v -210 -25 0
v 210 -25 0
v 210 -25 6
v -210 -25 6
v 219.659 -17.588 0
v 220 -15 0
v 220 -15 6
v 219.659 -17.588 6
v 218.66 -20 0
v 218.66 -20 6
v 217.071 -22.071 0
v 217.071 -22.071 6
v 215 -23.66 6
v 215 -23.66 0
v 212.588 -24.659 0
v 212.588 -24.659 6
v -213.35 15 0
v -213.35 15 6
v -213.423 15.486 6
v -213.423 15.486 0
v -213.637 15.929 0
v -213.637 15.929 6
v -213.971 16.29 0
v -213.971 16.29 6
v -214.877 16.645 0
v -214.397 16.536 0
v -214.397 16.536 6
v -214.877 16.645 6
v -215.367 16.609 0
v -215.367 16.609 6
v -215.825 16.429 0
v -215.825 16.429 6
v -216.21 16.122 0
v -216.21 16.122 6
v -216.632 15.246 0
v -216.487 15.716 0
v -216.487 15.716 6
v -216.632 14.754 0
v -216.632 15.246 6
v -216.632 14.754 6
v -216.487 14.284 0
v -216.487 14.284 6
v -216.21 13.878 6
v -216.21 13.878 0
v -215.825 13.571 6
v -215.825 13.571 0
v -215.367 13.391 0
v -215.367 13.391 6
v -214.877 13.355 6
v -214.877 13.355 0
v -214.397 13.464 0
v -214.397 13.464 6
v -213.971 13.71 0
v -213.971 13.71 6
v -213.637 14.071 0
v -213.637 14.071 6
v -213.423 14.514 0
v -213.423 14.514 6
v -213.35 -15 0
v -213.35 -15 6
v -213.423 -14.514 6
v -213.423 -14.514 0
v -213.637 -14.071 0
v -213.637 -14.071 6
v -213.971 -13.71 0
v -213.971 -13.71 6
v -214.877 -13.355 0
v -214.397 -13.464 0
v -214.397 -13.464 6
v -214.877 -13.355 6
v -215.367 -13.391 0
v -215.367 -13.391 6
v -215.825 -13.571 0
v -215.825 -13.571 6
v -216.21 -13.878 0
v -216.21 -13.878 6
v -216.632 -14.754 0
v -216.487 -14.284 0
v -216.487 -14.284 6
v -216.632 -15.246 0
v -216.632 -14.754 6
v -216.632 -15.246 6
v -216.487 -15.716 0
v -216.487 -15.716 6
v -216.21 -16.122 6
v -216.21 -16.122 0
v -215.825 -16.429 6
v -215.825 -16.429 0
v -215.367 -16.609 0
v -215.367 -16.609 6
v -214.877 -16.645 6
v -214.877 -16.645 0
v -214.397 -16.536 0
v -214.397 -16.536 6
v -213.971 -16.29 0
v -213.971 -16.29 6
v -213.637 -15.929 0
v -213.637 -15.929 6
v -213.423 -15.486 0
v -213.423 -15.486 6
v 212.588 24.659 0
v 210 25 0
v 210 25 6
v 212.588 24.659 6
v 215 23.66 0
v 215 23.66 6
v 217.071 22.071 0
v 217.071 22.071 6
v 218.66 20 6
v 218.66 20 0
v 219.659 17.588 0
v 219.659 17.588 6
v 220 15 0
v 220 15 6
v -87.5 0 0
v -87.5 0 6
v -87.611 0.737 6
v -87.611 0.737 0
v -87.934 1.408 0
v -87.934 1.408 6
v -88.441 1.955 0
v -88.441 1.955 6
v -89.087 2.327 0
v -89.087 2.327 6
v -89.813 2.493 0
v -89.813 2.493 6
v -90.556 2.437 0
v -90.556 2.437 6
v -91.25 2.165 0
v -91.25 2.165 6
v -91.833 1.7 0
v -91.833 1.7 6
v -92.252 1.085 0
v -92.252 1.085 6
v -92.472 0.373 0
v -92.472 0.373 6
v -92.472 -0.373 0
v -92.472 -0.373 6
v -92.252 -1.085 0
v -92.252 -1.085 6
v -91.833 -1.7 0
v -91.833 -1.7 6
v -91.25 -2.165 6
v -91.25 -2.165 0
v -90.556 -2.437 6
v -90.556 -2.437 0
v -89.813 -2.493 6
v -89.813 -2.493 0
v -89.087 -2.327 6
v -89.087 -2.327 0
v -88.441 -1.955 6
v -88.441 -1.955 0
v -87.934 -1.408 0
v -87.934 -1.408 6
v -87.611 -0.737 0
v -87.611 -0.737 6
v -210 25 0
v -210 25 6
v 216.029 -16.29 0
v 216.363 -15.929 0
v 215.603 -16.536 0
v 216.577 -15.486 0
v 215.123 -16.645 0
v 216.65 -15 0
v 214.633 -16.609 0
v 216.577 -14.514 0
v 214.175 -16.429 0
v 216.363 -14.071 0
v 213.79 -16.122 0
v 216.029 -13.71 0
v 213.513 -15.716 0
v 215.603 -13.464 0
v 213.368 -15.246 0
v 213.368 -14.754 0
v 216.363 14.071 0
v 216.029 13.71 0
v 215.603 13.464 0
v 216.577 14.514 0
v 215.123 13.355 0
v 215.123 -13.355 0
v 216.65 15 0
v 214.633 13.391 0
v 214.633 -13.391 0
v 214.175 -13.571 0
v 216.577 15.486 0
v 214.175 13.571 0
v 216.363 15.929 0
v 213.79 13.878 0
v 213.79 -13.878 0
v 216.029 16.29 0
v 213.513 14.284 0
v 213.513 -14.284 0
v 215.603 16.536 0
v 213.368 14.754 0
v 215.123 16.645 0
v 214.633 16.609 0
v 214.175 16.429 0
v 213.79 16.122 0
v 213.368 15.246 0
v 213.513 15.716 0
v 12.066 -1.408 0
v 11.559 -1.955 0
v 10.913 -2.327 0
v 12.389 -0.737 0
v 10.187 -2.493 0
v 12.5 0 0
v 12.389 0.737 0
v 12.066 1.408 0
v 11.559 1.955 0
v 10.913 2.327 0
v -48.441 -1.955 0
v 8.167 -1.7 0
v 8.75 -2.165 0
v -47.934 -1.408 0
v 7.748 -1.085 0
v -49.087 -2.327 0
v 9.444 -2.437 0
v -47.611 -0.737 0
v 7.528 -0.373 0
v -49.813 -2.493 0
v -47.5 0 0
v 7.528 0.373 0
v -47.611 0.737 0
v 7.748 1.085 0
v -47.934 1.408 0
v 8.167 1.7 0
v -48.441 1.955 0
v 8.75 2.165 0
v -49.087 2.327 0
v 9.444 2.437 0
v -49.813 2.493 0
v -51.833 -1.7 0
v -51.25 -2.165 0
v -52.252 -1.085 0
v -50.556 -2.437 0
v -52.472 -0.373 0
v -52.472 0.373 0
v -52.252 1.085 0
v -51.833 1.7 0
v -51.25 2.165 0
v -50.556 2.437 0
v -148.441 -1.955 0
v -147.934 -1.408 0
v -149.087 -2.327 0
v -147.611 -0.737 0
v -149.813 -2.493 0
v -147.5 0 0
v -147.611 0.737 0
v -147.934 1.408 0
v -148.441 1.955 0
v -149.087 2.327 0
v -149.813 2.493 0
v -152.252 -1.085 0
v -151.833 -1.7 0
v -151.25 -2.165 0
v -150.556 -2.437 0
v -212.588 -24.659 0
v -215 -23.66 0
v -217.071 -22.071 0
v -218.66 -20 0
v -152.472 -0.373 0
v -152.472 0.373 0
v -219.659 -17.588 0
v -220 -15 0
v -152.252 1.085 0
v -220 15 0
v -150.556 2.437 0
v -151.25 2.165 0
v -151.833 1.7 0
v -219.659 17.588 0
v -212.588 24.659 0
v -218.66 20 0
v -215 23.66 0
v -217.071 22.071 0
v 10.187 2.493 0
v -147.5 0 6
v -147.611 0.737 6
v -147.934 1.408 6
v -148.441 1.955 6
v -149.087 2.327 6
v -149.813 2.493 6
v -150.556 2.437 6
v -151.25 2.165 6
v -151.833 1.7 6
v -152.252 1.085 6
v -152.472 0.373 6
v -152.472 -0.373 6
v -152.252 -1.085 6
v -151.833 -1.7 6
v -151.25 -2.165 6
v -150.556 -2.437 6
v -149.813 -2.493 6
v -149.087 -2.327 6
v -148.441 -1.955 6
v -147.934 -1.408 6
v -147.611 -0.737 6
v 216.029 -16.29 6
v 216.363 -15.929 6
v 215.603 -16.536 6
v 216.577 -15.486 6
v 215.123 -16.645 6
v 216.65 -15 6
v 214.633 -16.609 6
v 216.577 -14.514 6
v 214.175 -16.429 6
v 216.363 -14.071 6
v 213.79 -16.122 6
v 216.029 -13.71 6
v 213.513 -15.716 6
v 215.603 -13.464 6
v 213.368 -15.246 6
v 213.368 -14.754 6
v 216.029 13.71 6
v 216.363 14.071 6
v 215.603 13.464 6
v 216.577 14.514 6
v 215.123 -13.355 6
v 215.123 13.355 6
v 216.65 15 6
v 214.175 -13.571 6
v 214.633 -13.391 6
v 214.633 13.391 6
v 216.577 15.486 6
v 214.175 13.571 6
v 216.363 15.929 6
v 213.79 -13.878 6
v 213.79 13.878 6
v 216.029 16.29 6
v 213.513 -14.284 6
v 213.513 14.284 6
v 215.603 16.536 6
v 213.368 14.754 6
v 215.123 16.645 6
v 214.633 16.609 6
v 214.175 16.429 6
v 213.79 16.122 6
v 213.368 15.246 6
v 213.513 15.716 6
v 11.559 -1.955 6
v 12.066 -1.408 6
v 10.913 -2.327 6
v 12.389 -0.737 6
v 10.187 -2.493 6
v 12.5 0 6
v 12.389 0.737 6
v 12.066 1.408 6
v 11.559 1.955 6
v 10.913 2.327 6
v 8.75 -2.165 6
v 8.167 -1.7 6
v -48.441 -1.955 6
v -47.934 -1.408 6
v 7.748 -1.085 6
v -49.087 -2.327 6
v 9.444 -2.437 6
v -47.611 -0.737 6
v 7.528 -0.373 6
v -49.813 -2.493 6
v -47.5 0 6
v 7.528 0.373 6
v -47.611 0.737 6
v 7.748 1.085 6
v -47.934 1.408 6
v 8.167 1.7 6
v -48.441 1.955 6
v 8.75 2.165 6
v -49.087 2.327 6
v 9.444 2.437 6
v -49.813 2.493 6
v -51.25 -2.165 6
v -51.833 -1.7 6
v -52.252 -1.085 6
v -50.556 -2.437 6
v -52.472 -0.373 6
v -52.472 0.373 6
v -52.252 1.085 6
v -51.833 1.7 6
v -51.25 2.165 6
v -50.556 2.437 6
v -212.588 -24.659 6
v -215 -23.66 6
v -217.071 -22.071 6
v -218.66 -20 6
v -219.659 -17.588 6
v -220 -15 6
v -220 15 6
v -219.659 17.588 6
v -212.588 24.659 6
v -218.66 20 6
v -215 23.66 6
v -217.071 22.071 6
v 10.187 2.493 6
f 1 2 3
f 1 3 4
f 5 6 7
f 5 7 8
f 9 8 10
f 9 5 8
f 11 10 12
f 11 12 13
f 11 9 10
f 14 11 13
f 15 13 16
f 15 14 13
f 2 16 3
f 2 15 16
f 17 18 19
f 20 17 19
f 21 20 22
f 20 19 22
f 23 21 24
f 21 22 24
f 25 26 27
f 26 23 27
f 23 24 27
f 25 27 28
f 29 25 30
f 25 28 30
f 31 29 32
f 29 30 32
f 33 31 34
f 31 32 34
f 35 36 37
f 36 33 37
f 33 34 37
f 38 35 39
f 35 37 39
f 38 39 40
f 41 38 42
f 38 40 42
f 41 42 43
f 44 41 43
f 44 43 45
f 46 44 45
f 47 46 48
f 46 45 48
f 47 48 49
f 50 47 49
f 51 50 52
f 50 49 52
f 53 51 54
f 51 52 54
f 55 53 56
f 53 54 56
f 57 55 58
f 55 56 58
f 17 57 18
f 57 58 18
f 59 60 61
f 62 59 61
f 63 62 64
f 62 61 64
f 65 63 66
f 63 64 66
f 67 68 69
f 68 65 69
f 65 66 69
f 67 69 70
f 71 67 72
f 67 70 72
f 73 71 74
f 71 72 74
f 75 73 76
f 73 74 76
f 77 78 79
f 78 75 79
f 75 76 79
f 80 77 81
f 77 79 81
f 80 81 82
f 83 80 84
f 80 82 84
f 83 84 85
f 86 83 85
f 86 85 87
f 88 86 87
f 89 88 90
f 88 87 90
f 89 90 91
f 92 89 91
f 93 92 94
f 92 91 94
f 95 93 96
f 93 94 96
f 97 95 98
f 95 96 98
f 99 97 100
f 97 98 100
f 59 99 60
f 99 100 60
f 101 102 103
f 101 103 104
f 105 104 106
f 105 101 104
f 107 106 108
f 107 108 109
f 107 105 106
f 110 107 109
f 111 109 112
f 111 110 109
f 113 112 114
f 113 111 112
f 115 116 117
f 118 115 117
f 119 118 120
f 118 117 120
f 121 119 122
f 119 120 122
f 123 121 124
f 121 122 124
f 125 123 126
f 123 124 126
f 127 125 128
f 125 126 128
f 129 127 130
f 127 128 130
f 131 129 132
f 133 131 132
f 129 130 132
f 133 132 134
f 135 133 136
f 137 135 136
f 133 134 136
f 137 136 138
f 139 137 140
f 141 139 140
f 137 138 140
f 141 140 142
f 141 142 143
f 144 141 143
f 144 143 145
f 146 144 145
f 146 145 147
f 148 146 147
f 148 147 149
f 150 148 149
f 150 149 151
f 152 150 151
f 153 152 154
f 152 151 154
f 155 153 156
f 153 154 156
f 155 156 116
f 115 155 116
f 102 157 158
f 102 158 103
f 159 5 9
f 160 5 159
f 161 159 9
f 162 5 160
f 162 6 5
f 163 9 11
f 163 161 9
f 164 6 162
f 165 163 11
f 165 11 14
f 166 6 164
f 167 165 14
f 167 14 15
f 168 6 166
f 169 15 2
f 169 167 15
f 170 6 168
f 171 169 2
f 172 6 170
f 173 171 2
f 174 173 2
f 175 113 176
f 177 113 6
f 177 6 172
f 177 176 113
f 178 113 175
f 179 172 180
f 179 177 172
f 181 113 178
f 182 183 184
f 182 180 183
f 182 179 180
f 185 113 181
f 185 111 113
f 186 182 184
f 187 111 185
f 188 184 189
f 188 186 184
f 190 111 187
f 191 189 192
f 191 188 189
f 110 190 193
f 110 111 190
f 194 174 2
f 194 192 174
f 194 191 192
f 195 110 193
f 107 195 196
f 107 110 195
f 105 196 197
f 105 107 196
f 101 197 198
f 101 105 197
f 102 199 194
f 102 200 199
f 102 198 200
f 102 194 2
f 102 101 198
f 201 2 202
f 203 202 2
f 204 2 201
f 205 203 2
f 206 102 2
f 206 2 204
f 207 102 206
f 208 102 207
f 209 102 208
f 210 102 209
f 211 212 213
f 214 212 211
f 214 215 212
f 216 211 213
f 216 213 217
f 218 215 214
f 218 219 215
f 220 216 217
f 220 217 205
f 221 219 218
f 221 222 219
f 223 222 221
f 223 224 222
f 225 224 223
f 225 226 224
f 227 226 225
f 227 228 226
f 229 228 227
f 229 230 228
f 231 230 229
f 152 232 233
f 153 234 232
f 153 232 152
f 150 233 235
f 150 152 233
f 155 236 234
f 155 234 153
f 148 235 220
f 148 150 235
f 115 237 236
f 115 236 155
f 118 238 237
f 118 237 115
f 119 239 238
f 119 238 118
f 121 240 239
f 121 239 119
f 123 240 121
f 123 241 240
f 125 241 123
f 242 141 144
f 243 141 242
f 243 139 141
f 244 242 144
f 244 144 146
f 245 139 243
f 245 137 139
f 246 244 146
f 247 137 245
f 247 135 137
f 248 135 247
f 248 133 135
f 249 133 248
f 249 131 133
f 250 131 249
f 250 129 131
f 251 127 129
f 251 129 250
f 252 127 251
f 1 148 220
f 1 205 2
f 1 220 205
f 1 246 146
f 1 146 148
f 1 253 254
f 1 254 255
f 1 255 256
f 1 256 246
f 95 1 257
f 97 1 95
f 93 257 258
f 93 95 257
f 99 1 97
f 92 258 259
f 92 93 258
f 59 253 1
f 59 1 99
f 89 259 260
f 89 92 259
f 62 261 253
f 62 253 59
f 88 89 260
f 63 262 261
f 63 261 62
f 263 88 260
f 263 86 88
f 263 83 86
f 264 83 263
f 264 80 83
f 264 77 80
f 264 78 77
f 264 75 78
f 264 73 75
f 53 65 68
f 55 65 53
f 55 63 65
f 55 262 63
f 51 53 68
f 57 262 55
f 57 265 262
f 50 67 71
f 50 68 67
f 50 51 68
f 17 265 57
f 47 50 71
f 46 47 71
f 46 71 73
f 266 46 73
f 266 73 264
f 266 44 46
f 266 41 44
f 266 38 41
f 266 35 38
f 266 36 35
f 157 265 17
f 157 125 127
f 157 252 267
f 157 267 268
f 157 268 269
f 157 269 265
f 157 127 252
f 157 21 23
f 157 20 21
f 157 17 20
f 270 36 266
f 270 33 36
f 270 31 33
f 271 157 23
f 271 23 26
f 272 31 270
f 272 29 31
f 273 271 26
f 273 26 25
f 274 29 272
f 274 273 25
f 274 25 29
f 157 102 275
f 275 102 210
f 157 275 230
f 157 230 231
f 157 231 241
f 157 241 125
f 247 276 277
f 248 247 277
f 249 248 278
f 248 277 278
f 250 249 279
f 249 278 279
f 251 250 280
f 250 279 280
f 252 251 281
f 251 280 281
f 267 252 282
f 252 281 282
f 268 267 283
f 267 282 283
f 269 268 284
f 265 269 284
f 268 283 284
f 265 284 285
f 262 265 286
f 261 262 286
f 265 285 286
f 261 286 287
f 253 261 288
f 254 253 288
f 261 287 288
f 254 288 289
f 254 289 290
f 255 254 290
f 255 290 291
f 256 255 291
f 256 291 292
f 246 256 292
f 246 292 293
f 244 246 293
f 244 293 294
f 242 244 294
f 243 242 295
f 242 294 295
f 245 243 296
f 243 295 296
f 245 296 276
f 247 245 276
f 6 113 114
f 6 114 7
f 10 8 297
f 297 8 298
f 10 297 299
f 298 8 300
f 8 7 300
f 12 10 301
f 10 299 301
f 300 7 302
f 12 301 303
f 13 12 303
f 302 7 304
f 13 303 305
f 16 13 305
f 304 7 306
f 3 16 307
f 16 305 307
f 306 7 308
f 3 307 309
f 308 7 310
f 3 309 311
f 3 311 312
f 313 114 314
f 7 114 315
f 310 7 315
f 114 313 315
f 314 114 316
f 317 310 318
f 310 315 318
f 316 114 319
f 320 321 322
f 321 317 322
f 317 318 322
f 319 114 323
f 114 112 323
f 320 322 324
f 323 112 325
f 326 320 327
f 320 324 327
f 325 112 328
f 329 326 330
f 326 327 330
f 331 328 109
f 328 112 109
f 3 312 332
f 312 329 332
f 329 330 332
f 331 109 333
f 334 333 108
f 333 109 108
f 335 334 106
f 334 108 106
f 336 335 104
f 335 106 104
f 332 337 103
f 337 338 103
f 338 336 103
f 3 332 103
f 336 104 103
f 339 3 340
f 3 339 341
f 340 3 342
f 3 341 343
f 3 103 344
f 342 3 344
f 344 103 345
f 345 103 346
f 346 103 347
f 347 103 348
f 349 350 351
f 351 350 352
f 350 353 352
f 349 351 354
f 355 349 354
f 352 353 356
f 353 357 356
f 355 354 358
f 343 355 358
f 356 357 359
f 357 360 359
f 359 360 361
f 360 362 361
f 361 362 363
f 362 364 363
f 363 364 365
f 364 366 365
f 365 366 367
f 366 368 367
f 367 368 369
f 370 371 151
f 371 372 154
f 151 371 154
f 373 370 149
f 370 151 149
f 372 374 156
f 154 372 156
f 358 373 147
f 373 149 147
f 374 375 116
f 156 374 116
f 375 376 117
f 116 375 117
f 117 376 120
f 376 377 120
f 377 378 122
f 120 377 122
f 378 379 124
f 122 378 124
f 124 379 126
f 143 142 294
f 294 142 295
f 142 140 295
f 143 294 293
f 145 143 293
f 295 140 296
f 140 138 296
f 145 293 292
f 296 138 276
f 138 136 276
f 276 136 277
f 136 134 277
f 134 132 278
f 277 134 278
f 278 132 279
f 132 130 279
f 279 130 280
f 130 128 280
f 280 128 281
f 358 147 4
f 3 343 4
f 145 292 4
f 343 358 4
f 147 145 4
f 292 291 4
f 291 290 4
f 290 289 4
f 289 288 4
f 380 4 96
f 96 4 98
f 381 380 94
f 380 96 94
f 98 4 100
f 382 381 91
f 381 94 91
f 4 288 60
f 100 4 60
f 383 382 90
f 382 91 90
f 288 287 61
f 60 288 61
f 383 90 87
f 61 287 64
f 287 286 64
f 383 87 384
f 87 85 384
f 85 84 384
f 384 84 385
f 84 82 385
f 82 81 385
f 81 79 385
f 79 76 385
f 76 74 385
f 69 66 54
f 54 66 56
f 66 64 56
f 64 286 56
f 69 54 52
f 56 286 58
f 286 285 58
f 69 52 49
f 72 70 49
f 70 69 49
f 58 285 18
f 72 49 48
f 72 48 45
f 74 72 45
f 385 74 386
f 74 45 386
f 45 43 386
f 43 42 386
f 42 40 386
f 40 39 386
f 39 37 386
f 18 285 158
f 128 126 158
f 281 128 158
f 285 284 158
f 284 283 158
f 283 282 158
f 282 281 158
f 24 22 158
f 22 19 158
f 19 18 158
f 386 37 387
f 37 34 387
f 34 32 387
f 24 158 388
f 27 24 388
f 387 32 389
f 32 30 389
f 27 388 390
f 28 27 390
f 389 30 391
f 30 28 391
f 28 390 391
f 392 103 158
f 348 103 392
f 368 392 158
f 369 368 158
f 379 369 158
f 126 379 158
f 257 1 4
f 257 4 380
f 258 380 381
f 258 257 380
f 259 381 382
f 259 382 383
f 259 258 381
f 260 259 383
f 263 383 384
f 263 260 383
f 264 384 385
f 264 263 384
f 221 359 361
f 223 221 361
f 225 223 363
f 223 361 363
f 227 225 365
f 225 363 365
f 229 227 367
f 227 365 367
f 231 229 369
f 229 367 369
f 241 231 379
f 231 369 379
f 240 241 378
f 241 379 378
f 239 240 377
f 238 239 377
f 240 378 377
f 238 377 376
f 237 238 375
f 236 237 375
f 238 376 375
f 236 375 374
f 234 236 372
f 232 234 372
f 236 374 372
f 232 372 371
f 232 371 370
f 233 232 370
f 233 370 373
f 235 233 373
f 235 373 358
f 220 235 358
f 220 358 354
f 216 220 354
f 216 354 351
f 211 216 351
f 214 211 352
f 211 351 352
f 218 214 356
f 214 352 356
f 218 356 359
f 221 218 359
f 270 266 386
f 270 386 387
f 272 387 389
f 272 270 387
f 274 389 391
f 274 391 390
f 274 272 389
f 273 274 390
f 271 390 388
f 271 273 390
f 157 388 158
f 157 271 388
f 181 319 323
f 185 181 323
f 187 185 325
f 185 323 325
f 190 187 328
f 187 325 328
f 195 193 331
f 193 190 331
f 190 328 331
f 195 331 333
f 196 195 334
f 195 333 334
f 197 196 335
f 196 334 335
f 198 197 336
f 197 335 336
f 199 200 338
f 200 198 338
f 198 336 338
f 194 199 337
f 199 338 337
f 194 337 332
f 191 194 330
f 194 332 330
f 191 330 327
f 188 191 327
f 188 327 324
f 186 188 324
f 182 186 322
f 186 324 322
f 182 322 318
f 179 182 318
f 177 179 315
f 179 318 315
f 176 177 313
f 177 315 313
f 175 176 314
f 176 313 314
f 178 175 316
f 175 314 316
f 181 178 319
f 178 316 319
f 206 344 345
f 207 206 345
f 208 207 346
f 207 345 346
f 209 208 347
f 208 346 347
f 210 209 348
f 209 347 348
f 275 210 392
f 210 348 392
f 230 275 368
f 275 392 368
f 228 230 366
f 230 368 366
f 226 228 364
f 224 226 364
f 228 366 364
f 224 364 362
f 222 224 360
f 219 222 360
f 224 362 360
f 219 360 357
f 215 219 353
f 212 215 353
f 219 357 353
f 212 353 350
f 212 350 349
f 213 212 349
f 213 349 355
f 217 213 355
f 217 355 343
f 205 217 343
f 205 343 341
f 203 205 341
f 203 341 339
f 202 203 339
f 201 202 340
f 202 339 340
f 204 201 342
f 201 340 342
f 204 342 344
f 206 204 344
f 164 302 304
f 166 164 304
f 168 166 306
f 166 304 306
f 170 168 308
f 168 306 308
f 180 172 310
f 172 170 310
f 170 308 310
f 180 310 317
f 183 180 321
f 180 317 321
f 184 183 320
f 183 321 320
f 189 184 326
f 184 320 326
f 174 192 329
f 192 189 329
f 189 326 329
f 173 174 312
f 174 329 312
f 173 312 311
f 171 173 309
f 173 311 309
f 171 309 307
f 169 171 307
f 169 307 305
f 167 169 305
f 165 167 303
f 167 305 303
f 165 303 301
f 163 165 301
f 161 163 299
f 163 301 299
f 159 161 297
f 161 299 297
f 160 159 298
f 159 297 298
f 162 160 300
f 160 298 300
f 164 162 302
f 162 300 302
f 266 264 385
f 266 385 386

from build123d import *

# Parameters (mm, degrees)
BOSS_EXTRU_1_DEPTH                            = 6
ESQUISSE2_R                                   = 1.65
ESQUISSE2_R_2                                 = 2.5
ENL_V_MAT_EXTRU_1_DEPTH                       = 6
TROU_POUR_TARAUDAGE_POUR_TROU_TARAUD_M6_D     = 5
TROU_POUR_TARAUDAGE_POUR_TROU_TARAUD_M6_DEPTH = 15
TROU_POUR_TARAUDAGE_POUR_TROU_TARAUD_M6_TIP   = 1.502151548
TROU_POUR_TARAUDAGE_POUR_TROU_TARAUD_M4_D     = 3.3
TROU_POUR_TARAUDAGE_POUR_TROU_TARAUD_M4_DEPTH = 15
TROU_POUR_TARAUDAGE_POUR_TROU_TARAUD_M4_TIP   = 0.991420021


with BuildPart() as part:
    # Esquisse1 → Boss.-Extru.1 (new body)
    with BuildSketch(Plane.XY):
        with BuildLine():
            Line((210, -25), (-210, -25))
            ThreePointArc((-210, -25), (-217.071067812, -22.071067812), (-220, -15))
            Line((-220, -15), (-220, 15))
            ThreePointArc((-220, 15), (-217.071067812, 22.071067812), (-210, 25))
            Line((-210, 25), (210, 25))
            ThreePointArc((210, 25), (217.071067812, 22.071067812), (220, 15))
            Line((220, 15), (220, -15))
            ThreePointArc((220, -15), (217.071067812, -22.071067812), (210, -25))
        make_face()
    extrude(amount=BOSS_EXTRU_1_DEPTH)

    # Esquisse2 → Enlèv. mat.-Extru.1 (cut)
    with BuildSketch(Plane.XY.offset(6)):
        with Locations((215, 15)):
            Circle(ESQUISSE2_R)
        with Locations((215, -15)):
            Circle(ESQUISSE2_R)
        with Locations((-215, 15)):
            Circle(ESQUISSE2_R)
        with Locations((-215, -15)):
            Circle(ESQUISSE2_R)
        with Locations((-150, 0)):
            Circle(ESQUISSE2_R_2)
        with Locations((-90, 0)):
            Circle(ESQUISSE2_R_2)
        with Locations((-50, 0)):
            Circle(ESQUISSE2_R_2)
        with Locations((10, 0)):
            Circle(ESQUISSE2_R_2)
    extrude(amount=-ENL_V_MAT_EXTRU_1_DEPTH, mode=Mode.SUBTRACT)

    # Trou pour taraudage pour trou taraudé M6x1.01
    with Locations(Plane(origin=(-150, 0, 6), x_dir=(1, 0, 0), z_dir=(0, 0, 1))):
        with Locations((0, 0), (60, 0), (100, 0), (160, 0)):
            Hole(TROU_POUR_TARAUDAGE_POUR_TROU_TARAUD_M6_D / 2, depth=TROU_POUR_TARAUDAGE_POUR_TROU_TARAUD_M6_DEPTH)
            with Locations((0, 0, -(TROU_POUR_TARAUDAGE_POUR_TROU_TARAUD_M6_DEPTH + TROU_POUR_TARAUDAGE_POUR_TROU_TARAUD_M6_TIP / 2))):  # 118° drill point
                Cone(0, TROU_POUR_TARAUDAGE_POUR_TROU_TARAUD_M6_D / 2, TROU_POUR_TARAUDAGE_POUR_TROU_TARAUD_M6_TIP, mode=Mode.SUBTRACT)

    # Trou pour taraudage pour trou taraudé M4x0.71
    with Locations(Plane(origin=(-215, 15, 6), x_dir=(1, 0, 0), z_dir=(0, 0, 1))):
        with Locations((0, 0), (0, -30), (430, 0), (430, -30)):
            Hole(TROU_POUR_TARAUDAGE_POUR_TROU_TARAUD_M4_D / 2, depth=TROU_POUR_TARAUDAGE_POUR_TROU_TARAUD_M4_DEPTH)
            with Locations((0, 0, -(TROU_POUR_TARAUDAGE_POUR_TROU_TARAUD_M4_DEPTH + TROU_POUR_TARAUDAGE_POUR_TROU_TARAUD_M4_TIP / 2))):  # 118° drill point
                Cone(0, TROU_POUR_TARAUDAGE_POUR_TROU_TARAUD_M4_D / 2, TROU_POUR_TARAUDAGE_POUR_TROU_TARAUD_M4_TIP, mode=Mode.SUBTRACT)


solid = part.part
